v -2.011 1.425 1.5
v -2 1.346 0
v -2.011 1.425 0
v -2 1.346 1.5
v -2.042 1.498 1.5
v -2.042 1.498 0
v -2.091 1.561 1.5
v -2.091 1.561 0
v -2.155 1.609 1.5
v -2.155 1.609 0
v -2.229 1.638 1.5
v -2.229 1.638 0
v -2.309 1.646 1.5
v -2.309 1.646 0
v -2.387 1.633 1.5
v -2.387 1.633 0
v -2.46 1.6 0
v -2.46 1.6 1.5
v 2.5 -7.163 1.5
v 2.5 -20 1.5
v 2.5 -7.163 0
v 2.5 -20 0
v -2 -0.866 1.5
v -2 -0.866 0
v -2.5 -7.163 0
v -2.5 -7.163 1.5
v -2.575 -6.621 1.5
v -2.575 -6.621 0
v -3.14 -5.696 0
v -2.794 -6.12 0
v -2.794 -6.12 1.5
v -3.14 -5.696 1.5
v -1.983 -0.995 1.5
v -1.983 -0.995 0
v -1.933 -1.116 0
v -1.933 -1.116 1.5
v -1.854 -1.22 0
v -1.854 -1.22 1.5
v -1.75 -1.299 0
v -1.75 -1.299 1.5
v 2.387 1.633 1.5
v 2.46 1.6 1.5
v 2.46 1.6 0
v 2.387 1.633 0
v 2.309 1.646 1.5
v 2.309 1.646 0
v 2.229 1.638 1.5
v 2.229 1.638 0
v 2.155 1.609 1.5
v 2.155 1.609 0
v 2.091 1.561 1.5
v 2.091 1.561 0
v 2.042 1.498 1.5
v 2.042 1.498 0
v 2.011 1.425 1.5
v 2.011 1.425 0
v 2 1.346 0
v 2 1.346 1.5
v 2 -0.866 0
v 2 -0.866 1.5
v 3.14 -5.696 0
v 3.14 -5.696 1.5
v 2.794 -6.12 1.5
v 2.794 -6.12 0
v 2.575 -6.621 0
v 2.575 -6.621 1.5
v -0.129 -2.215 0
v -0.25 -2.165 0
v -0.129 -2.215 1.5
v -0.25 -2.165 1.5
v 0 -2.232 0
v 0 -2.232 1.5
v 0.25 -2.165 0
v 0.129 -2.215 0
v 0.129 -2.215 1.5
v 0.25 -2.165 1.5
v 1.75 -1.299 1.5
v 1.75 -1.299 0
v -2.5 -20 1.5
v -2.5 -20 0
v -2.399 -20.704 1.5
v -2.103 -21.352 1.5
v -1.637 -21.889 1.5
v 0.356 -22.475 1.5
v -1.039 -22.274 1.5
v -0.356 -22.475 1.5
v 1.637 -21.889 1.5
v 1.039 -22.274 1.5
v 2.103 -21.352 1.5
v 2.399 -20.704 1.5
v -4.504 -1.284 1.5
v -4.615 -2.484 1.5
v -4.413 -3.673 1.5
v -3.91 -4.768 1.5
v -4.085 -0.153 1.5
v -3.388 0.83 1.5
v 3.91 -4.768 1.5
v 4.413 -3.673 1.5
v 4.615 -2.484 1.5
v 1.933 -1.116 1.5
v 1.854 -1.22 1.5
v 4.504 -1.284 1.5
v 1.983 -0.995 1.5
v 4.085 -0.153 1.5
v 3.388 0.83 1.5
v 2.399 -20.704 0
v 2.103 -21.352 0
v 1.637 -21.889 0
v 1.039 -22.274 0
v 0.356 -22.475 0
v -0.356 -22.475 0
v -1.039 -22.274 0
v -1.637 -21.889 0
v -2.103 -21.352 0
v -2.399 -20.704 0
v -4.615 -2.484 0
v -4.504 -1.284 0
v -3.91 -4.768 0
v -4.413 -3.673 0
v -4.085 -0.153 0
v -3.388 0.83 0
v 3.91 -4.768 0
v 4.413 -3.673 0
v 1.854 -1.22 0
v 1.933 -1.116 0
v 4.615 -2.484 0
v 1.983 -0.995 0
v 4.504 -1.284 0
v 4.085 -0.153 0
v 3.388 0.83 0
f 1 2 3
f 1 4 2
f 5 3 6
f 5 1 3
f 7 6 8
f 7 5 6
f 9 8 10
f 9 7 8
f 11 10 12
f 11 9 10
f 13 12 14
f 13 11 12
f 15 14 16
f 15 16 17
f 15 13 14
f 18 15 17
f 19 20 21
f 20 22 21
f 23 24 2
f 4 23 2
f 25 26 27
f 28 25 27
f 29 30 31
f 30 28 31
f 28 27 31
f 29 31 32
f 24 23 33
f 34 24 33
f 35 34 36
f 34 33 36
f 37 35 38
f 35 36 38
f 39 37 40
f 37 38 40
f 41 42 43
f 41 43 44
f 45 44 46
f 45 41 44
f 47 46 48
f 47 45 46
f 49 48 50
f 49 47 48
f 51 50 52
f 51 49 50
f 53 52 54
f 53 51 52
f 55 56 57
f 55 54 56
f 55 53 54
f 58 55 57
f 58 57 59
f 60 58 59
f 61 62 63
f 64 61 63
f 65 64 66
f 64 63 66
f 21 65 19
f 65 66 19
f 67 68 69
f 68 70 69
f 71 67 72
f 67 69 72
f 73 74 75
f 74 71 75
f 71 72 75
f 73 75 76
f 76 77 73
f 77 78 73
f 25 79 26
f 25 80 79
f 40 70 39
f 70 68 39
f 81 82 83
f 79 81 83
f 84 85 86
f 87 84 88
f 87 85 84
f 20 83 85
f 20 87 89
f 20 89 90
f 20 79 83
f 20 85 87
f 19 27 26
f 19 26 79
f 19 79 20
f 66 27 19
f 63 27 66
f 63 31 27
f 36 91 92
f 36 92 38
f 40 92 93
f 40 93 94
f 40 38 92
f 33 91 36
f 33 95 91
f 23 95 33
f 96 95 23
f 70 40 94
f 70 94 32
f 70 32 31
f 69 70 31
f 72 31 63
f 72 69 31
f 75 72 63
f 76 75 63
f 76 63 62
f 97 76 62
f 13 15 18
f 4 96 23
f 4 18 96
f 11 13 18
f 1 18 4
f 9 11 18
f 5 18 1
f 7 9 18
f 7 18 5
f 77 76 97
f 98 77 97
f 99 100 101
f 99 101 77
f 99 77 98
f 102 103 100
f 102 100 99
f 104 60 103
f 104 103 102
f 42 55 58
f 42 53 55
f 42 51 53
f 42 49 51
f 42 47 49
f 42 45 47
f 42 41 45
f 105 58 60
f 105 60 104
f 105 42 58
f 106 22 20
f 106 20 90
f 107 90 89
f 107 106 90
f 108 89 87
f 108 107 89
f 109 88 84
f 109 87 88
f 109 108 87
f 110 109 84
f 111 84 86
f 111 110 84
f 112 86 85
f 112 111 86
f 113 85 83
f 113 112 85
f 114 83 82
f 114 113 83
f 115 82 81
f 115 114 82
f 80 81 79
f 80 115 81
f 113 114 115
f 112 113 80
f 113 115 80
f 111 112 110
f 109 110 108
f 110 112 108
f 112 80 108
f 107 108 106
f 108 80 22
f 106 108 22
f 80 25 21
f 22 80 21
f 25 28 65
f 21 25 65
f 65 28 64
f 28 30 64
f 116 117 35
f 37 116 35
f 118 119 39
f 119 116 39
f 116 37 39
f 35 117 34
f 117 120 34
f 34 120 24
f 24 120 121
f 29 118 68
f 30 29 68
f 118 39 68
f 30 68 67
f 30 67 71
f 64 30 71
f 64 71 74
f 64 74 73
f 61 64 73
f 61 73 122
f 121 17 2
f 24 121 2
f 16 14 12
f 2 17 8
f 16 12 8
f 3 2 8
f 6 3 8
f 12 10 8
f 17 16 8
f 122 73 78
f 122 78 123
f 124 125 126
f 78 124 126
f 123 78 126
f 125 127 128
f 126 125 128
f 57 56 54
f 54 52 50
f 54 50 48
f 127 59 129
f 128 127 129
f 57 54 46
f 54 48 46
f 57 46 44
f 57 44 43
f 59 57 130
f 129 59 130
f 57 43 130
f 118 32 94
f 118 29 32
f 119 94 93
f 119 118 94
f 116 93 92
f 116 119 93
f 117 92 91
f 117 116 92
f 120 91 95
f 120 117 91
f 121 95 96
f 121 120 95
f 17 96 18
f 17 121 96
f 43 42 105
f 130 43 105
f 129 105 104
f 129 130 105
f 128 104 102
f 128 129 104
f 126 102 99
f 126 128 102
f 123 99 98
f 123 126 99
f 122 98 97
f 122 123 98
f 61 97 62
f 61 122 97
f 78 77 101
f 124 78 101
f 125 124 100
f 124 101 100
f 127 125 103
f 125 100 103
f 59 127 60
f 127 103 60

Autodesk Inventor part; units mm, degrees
ref_plane "YZ Plane" through (0, 0, 0) normal (1, 0, 0) x (0, 1, 0)
ref_plane "XZ Plane" through (0, 0, 0) normal (0, 1, 0) x (-1, 0, 0)
ref_plane "XY Plane" through (0, 0, 0) normal (0, 0, 1) x (1, 0, 0)
sketch "スケッチ1" plane through (0, 0, 0) normal (0, 0, 1) x (1, 0, 0)
  line L0 (0, 2.3094) -> (2, 1.1547)
  line L1 (2, 1.1547) -> (2, -1.1547)
  line L2 (2, -1.1547) -> (0, -2.3094)
  line L3 (0, -2.3094) -> (-2, -1.1547)
  line L4 (-2, -1.1547) -> (-2, 1.1547)
  line L5 (-2, 1.1547) -> (0, 2.3094)
  circle A0 centre (0, 0) radius 3.5
  line L6 (0, 0) -> (0, -20)
  circle A1 centre (0, -20) radius 2.5
  line L7 (2.5, -20) -> (2.5, -2.4495)
  line L8 (-2.5, -20) -> (-2.5, -2.4495)
  line L9 (-2, 1.1547) -> (-3.4875, 0.2959)
  line L10 (2, 1.1547) -> (3.4875, 0.2959)
  circle A2 centre (0, -2.3094) radius 4.6188
  line L11 (2, 1.1547) -> (2, 1.8539)
  line L12 (-2, 1.1547) -> (-2, 1.8539)
  dimension "d0" = 4
  dimension "d1" = 7
  dimension "d2" = 20
  dimension "d3" = 5
extrude "押し出し1" add sketch "スケッチ1" along normal blind 1.5 contours L10 A0 L6 L2 L1 | L11 A2 A0 L10 | L4 L3 L6 A0 L9 | L9 A0 A2 L12 | A0 A2 L7 | A0 L8 A2 | A0 L6 A2 L8 | A2 L6 A1 L8 | A0 L7 A2 L6 | L7 A1 L6 A2 | A1
fillet "フィレット1" radius 0.3 2 edges at (-2, 1.8539, 0.75) (2, 1.8539, 0.75)
fillet "フィレット2" radius 0.5 3 edges at (2, -1.1547, 0.75) (0, -2.3094, 0.75) (-2, -1.1547, 0.75)
fillet "フィレット3" radius 2 2 edges at (-2.5, -6.1931, 0.75) (2.5, -6.1931, 0.75)
properties part number "M2ナットレンチ"
